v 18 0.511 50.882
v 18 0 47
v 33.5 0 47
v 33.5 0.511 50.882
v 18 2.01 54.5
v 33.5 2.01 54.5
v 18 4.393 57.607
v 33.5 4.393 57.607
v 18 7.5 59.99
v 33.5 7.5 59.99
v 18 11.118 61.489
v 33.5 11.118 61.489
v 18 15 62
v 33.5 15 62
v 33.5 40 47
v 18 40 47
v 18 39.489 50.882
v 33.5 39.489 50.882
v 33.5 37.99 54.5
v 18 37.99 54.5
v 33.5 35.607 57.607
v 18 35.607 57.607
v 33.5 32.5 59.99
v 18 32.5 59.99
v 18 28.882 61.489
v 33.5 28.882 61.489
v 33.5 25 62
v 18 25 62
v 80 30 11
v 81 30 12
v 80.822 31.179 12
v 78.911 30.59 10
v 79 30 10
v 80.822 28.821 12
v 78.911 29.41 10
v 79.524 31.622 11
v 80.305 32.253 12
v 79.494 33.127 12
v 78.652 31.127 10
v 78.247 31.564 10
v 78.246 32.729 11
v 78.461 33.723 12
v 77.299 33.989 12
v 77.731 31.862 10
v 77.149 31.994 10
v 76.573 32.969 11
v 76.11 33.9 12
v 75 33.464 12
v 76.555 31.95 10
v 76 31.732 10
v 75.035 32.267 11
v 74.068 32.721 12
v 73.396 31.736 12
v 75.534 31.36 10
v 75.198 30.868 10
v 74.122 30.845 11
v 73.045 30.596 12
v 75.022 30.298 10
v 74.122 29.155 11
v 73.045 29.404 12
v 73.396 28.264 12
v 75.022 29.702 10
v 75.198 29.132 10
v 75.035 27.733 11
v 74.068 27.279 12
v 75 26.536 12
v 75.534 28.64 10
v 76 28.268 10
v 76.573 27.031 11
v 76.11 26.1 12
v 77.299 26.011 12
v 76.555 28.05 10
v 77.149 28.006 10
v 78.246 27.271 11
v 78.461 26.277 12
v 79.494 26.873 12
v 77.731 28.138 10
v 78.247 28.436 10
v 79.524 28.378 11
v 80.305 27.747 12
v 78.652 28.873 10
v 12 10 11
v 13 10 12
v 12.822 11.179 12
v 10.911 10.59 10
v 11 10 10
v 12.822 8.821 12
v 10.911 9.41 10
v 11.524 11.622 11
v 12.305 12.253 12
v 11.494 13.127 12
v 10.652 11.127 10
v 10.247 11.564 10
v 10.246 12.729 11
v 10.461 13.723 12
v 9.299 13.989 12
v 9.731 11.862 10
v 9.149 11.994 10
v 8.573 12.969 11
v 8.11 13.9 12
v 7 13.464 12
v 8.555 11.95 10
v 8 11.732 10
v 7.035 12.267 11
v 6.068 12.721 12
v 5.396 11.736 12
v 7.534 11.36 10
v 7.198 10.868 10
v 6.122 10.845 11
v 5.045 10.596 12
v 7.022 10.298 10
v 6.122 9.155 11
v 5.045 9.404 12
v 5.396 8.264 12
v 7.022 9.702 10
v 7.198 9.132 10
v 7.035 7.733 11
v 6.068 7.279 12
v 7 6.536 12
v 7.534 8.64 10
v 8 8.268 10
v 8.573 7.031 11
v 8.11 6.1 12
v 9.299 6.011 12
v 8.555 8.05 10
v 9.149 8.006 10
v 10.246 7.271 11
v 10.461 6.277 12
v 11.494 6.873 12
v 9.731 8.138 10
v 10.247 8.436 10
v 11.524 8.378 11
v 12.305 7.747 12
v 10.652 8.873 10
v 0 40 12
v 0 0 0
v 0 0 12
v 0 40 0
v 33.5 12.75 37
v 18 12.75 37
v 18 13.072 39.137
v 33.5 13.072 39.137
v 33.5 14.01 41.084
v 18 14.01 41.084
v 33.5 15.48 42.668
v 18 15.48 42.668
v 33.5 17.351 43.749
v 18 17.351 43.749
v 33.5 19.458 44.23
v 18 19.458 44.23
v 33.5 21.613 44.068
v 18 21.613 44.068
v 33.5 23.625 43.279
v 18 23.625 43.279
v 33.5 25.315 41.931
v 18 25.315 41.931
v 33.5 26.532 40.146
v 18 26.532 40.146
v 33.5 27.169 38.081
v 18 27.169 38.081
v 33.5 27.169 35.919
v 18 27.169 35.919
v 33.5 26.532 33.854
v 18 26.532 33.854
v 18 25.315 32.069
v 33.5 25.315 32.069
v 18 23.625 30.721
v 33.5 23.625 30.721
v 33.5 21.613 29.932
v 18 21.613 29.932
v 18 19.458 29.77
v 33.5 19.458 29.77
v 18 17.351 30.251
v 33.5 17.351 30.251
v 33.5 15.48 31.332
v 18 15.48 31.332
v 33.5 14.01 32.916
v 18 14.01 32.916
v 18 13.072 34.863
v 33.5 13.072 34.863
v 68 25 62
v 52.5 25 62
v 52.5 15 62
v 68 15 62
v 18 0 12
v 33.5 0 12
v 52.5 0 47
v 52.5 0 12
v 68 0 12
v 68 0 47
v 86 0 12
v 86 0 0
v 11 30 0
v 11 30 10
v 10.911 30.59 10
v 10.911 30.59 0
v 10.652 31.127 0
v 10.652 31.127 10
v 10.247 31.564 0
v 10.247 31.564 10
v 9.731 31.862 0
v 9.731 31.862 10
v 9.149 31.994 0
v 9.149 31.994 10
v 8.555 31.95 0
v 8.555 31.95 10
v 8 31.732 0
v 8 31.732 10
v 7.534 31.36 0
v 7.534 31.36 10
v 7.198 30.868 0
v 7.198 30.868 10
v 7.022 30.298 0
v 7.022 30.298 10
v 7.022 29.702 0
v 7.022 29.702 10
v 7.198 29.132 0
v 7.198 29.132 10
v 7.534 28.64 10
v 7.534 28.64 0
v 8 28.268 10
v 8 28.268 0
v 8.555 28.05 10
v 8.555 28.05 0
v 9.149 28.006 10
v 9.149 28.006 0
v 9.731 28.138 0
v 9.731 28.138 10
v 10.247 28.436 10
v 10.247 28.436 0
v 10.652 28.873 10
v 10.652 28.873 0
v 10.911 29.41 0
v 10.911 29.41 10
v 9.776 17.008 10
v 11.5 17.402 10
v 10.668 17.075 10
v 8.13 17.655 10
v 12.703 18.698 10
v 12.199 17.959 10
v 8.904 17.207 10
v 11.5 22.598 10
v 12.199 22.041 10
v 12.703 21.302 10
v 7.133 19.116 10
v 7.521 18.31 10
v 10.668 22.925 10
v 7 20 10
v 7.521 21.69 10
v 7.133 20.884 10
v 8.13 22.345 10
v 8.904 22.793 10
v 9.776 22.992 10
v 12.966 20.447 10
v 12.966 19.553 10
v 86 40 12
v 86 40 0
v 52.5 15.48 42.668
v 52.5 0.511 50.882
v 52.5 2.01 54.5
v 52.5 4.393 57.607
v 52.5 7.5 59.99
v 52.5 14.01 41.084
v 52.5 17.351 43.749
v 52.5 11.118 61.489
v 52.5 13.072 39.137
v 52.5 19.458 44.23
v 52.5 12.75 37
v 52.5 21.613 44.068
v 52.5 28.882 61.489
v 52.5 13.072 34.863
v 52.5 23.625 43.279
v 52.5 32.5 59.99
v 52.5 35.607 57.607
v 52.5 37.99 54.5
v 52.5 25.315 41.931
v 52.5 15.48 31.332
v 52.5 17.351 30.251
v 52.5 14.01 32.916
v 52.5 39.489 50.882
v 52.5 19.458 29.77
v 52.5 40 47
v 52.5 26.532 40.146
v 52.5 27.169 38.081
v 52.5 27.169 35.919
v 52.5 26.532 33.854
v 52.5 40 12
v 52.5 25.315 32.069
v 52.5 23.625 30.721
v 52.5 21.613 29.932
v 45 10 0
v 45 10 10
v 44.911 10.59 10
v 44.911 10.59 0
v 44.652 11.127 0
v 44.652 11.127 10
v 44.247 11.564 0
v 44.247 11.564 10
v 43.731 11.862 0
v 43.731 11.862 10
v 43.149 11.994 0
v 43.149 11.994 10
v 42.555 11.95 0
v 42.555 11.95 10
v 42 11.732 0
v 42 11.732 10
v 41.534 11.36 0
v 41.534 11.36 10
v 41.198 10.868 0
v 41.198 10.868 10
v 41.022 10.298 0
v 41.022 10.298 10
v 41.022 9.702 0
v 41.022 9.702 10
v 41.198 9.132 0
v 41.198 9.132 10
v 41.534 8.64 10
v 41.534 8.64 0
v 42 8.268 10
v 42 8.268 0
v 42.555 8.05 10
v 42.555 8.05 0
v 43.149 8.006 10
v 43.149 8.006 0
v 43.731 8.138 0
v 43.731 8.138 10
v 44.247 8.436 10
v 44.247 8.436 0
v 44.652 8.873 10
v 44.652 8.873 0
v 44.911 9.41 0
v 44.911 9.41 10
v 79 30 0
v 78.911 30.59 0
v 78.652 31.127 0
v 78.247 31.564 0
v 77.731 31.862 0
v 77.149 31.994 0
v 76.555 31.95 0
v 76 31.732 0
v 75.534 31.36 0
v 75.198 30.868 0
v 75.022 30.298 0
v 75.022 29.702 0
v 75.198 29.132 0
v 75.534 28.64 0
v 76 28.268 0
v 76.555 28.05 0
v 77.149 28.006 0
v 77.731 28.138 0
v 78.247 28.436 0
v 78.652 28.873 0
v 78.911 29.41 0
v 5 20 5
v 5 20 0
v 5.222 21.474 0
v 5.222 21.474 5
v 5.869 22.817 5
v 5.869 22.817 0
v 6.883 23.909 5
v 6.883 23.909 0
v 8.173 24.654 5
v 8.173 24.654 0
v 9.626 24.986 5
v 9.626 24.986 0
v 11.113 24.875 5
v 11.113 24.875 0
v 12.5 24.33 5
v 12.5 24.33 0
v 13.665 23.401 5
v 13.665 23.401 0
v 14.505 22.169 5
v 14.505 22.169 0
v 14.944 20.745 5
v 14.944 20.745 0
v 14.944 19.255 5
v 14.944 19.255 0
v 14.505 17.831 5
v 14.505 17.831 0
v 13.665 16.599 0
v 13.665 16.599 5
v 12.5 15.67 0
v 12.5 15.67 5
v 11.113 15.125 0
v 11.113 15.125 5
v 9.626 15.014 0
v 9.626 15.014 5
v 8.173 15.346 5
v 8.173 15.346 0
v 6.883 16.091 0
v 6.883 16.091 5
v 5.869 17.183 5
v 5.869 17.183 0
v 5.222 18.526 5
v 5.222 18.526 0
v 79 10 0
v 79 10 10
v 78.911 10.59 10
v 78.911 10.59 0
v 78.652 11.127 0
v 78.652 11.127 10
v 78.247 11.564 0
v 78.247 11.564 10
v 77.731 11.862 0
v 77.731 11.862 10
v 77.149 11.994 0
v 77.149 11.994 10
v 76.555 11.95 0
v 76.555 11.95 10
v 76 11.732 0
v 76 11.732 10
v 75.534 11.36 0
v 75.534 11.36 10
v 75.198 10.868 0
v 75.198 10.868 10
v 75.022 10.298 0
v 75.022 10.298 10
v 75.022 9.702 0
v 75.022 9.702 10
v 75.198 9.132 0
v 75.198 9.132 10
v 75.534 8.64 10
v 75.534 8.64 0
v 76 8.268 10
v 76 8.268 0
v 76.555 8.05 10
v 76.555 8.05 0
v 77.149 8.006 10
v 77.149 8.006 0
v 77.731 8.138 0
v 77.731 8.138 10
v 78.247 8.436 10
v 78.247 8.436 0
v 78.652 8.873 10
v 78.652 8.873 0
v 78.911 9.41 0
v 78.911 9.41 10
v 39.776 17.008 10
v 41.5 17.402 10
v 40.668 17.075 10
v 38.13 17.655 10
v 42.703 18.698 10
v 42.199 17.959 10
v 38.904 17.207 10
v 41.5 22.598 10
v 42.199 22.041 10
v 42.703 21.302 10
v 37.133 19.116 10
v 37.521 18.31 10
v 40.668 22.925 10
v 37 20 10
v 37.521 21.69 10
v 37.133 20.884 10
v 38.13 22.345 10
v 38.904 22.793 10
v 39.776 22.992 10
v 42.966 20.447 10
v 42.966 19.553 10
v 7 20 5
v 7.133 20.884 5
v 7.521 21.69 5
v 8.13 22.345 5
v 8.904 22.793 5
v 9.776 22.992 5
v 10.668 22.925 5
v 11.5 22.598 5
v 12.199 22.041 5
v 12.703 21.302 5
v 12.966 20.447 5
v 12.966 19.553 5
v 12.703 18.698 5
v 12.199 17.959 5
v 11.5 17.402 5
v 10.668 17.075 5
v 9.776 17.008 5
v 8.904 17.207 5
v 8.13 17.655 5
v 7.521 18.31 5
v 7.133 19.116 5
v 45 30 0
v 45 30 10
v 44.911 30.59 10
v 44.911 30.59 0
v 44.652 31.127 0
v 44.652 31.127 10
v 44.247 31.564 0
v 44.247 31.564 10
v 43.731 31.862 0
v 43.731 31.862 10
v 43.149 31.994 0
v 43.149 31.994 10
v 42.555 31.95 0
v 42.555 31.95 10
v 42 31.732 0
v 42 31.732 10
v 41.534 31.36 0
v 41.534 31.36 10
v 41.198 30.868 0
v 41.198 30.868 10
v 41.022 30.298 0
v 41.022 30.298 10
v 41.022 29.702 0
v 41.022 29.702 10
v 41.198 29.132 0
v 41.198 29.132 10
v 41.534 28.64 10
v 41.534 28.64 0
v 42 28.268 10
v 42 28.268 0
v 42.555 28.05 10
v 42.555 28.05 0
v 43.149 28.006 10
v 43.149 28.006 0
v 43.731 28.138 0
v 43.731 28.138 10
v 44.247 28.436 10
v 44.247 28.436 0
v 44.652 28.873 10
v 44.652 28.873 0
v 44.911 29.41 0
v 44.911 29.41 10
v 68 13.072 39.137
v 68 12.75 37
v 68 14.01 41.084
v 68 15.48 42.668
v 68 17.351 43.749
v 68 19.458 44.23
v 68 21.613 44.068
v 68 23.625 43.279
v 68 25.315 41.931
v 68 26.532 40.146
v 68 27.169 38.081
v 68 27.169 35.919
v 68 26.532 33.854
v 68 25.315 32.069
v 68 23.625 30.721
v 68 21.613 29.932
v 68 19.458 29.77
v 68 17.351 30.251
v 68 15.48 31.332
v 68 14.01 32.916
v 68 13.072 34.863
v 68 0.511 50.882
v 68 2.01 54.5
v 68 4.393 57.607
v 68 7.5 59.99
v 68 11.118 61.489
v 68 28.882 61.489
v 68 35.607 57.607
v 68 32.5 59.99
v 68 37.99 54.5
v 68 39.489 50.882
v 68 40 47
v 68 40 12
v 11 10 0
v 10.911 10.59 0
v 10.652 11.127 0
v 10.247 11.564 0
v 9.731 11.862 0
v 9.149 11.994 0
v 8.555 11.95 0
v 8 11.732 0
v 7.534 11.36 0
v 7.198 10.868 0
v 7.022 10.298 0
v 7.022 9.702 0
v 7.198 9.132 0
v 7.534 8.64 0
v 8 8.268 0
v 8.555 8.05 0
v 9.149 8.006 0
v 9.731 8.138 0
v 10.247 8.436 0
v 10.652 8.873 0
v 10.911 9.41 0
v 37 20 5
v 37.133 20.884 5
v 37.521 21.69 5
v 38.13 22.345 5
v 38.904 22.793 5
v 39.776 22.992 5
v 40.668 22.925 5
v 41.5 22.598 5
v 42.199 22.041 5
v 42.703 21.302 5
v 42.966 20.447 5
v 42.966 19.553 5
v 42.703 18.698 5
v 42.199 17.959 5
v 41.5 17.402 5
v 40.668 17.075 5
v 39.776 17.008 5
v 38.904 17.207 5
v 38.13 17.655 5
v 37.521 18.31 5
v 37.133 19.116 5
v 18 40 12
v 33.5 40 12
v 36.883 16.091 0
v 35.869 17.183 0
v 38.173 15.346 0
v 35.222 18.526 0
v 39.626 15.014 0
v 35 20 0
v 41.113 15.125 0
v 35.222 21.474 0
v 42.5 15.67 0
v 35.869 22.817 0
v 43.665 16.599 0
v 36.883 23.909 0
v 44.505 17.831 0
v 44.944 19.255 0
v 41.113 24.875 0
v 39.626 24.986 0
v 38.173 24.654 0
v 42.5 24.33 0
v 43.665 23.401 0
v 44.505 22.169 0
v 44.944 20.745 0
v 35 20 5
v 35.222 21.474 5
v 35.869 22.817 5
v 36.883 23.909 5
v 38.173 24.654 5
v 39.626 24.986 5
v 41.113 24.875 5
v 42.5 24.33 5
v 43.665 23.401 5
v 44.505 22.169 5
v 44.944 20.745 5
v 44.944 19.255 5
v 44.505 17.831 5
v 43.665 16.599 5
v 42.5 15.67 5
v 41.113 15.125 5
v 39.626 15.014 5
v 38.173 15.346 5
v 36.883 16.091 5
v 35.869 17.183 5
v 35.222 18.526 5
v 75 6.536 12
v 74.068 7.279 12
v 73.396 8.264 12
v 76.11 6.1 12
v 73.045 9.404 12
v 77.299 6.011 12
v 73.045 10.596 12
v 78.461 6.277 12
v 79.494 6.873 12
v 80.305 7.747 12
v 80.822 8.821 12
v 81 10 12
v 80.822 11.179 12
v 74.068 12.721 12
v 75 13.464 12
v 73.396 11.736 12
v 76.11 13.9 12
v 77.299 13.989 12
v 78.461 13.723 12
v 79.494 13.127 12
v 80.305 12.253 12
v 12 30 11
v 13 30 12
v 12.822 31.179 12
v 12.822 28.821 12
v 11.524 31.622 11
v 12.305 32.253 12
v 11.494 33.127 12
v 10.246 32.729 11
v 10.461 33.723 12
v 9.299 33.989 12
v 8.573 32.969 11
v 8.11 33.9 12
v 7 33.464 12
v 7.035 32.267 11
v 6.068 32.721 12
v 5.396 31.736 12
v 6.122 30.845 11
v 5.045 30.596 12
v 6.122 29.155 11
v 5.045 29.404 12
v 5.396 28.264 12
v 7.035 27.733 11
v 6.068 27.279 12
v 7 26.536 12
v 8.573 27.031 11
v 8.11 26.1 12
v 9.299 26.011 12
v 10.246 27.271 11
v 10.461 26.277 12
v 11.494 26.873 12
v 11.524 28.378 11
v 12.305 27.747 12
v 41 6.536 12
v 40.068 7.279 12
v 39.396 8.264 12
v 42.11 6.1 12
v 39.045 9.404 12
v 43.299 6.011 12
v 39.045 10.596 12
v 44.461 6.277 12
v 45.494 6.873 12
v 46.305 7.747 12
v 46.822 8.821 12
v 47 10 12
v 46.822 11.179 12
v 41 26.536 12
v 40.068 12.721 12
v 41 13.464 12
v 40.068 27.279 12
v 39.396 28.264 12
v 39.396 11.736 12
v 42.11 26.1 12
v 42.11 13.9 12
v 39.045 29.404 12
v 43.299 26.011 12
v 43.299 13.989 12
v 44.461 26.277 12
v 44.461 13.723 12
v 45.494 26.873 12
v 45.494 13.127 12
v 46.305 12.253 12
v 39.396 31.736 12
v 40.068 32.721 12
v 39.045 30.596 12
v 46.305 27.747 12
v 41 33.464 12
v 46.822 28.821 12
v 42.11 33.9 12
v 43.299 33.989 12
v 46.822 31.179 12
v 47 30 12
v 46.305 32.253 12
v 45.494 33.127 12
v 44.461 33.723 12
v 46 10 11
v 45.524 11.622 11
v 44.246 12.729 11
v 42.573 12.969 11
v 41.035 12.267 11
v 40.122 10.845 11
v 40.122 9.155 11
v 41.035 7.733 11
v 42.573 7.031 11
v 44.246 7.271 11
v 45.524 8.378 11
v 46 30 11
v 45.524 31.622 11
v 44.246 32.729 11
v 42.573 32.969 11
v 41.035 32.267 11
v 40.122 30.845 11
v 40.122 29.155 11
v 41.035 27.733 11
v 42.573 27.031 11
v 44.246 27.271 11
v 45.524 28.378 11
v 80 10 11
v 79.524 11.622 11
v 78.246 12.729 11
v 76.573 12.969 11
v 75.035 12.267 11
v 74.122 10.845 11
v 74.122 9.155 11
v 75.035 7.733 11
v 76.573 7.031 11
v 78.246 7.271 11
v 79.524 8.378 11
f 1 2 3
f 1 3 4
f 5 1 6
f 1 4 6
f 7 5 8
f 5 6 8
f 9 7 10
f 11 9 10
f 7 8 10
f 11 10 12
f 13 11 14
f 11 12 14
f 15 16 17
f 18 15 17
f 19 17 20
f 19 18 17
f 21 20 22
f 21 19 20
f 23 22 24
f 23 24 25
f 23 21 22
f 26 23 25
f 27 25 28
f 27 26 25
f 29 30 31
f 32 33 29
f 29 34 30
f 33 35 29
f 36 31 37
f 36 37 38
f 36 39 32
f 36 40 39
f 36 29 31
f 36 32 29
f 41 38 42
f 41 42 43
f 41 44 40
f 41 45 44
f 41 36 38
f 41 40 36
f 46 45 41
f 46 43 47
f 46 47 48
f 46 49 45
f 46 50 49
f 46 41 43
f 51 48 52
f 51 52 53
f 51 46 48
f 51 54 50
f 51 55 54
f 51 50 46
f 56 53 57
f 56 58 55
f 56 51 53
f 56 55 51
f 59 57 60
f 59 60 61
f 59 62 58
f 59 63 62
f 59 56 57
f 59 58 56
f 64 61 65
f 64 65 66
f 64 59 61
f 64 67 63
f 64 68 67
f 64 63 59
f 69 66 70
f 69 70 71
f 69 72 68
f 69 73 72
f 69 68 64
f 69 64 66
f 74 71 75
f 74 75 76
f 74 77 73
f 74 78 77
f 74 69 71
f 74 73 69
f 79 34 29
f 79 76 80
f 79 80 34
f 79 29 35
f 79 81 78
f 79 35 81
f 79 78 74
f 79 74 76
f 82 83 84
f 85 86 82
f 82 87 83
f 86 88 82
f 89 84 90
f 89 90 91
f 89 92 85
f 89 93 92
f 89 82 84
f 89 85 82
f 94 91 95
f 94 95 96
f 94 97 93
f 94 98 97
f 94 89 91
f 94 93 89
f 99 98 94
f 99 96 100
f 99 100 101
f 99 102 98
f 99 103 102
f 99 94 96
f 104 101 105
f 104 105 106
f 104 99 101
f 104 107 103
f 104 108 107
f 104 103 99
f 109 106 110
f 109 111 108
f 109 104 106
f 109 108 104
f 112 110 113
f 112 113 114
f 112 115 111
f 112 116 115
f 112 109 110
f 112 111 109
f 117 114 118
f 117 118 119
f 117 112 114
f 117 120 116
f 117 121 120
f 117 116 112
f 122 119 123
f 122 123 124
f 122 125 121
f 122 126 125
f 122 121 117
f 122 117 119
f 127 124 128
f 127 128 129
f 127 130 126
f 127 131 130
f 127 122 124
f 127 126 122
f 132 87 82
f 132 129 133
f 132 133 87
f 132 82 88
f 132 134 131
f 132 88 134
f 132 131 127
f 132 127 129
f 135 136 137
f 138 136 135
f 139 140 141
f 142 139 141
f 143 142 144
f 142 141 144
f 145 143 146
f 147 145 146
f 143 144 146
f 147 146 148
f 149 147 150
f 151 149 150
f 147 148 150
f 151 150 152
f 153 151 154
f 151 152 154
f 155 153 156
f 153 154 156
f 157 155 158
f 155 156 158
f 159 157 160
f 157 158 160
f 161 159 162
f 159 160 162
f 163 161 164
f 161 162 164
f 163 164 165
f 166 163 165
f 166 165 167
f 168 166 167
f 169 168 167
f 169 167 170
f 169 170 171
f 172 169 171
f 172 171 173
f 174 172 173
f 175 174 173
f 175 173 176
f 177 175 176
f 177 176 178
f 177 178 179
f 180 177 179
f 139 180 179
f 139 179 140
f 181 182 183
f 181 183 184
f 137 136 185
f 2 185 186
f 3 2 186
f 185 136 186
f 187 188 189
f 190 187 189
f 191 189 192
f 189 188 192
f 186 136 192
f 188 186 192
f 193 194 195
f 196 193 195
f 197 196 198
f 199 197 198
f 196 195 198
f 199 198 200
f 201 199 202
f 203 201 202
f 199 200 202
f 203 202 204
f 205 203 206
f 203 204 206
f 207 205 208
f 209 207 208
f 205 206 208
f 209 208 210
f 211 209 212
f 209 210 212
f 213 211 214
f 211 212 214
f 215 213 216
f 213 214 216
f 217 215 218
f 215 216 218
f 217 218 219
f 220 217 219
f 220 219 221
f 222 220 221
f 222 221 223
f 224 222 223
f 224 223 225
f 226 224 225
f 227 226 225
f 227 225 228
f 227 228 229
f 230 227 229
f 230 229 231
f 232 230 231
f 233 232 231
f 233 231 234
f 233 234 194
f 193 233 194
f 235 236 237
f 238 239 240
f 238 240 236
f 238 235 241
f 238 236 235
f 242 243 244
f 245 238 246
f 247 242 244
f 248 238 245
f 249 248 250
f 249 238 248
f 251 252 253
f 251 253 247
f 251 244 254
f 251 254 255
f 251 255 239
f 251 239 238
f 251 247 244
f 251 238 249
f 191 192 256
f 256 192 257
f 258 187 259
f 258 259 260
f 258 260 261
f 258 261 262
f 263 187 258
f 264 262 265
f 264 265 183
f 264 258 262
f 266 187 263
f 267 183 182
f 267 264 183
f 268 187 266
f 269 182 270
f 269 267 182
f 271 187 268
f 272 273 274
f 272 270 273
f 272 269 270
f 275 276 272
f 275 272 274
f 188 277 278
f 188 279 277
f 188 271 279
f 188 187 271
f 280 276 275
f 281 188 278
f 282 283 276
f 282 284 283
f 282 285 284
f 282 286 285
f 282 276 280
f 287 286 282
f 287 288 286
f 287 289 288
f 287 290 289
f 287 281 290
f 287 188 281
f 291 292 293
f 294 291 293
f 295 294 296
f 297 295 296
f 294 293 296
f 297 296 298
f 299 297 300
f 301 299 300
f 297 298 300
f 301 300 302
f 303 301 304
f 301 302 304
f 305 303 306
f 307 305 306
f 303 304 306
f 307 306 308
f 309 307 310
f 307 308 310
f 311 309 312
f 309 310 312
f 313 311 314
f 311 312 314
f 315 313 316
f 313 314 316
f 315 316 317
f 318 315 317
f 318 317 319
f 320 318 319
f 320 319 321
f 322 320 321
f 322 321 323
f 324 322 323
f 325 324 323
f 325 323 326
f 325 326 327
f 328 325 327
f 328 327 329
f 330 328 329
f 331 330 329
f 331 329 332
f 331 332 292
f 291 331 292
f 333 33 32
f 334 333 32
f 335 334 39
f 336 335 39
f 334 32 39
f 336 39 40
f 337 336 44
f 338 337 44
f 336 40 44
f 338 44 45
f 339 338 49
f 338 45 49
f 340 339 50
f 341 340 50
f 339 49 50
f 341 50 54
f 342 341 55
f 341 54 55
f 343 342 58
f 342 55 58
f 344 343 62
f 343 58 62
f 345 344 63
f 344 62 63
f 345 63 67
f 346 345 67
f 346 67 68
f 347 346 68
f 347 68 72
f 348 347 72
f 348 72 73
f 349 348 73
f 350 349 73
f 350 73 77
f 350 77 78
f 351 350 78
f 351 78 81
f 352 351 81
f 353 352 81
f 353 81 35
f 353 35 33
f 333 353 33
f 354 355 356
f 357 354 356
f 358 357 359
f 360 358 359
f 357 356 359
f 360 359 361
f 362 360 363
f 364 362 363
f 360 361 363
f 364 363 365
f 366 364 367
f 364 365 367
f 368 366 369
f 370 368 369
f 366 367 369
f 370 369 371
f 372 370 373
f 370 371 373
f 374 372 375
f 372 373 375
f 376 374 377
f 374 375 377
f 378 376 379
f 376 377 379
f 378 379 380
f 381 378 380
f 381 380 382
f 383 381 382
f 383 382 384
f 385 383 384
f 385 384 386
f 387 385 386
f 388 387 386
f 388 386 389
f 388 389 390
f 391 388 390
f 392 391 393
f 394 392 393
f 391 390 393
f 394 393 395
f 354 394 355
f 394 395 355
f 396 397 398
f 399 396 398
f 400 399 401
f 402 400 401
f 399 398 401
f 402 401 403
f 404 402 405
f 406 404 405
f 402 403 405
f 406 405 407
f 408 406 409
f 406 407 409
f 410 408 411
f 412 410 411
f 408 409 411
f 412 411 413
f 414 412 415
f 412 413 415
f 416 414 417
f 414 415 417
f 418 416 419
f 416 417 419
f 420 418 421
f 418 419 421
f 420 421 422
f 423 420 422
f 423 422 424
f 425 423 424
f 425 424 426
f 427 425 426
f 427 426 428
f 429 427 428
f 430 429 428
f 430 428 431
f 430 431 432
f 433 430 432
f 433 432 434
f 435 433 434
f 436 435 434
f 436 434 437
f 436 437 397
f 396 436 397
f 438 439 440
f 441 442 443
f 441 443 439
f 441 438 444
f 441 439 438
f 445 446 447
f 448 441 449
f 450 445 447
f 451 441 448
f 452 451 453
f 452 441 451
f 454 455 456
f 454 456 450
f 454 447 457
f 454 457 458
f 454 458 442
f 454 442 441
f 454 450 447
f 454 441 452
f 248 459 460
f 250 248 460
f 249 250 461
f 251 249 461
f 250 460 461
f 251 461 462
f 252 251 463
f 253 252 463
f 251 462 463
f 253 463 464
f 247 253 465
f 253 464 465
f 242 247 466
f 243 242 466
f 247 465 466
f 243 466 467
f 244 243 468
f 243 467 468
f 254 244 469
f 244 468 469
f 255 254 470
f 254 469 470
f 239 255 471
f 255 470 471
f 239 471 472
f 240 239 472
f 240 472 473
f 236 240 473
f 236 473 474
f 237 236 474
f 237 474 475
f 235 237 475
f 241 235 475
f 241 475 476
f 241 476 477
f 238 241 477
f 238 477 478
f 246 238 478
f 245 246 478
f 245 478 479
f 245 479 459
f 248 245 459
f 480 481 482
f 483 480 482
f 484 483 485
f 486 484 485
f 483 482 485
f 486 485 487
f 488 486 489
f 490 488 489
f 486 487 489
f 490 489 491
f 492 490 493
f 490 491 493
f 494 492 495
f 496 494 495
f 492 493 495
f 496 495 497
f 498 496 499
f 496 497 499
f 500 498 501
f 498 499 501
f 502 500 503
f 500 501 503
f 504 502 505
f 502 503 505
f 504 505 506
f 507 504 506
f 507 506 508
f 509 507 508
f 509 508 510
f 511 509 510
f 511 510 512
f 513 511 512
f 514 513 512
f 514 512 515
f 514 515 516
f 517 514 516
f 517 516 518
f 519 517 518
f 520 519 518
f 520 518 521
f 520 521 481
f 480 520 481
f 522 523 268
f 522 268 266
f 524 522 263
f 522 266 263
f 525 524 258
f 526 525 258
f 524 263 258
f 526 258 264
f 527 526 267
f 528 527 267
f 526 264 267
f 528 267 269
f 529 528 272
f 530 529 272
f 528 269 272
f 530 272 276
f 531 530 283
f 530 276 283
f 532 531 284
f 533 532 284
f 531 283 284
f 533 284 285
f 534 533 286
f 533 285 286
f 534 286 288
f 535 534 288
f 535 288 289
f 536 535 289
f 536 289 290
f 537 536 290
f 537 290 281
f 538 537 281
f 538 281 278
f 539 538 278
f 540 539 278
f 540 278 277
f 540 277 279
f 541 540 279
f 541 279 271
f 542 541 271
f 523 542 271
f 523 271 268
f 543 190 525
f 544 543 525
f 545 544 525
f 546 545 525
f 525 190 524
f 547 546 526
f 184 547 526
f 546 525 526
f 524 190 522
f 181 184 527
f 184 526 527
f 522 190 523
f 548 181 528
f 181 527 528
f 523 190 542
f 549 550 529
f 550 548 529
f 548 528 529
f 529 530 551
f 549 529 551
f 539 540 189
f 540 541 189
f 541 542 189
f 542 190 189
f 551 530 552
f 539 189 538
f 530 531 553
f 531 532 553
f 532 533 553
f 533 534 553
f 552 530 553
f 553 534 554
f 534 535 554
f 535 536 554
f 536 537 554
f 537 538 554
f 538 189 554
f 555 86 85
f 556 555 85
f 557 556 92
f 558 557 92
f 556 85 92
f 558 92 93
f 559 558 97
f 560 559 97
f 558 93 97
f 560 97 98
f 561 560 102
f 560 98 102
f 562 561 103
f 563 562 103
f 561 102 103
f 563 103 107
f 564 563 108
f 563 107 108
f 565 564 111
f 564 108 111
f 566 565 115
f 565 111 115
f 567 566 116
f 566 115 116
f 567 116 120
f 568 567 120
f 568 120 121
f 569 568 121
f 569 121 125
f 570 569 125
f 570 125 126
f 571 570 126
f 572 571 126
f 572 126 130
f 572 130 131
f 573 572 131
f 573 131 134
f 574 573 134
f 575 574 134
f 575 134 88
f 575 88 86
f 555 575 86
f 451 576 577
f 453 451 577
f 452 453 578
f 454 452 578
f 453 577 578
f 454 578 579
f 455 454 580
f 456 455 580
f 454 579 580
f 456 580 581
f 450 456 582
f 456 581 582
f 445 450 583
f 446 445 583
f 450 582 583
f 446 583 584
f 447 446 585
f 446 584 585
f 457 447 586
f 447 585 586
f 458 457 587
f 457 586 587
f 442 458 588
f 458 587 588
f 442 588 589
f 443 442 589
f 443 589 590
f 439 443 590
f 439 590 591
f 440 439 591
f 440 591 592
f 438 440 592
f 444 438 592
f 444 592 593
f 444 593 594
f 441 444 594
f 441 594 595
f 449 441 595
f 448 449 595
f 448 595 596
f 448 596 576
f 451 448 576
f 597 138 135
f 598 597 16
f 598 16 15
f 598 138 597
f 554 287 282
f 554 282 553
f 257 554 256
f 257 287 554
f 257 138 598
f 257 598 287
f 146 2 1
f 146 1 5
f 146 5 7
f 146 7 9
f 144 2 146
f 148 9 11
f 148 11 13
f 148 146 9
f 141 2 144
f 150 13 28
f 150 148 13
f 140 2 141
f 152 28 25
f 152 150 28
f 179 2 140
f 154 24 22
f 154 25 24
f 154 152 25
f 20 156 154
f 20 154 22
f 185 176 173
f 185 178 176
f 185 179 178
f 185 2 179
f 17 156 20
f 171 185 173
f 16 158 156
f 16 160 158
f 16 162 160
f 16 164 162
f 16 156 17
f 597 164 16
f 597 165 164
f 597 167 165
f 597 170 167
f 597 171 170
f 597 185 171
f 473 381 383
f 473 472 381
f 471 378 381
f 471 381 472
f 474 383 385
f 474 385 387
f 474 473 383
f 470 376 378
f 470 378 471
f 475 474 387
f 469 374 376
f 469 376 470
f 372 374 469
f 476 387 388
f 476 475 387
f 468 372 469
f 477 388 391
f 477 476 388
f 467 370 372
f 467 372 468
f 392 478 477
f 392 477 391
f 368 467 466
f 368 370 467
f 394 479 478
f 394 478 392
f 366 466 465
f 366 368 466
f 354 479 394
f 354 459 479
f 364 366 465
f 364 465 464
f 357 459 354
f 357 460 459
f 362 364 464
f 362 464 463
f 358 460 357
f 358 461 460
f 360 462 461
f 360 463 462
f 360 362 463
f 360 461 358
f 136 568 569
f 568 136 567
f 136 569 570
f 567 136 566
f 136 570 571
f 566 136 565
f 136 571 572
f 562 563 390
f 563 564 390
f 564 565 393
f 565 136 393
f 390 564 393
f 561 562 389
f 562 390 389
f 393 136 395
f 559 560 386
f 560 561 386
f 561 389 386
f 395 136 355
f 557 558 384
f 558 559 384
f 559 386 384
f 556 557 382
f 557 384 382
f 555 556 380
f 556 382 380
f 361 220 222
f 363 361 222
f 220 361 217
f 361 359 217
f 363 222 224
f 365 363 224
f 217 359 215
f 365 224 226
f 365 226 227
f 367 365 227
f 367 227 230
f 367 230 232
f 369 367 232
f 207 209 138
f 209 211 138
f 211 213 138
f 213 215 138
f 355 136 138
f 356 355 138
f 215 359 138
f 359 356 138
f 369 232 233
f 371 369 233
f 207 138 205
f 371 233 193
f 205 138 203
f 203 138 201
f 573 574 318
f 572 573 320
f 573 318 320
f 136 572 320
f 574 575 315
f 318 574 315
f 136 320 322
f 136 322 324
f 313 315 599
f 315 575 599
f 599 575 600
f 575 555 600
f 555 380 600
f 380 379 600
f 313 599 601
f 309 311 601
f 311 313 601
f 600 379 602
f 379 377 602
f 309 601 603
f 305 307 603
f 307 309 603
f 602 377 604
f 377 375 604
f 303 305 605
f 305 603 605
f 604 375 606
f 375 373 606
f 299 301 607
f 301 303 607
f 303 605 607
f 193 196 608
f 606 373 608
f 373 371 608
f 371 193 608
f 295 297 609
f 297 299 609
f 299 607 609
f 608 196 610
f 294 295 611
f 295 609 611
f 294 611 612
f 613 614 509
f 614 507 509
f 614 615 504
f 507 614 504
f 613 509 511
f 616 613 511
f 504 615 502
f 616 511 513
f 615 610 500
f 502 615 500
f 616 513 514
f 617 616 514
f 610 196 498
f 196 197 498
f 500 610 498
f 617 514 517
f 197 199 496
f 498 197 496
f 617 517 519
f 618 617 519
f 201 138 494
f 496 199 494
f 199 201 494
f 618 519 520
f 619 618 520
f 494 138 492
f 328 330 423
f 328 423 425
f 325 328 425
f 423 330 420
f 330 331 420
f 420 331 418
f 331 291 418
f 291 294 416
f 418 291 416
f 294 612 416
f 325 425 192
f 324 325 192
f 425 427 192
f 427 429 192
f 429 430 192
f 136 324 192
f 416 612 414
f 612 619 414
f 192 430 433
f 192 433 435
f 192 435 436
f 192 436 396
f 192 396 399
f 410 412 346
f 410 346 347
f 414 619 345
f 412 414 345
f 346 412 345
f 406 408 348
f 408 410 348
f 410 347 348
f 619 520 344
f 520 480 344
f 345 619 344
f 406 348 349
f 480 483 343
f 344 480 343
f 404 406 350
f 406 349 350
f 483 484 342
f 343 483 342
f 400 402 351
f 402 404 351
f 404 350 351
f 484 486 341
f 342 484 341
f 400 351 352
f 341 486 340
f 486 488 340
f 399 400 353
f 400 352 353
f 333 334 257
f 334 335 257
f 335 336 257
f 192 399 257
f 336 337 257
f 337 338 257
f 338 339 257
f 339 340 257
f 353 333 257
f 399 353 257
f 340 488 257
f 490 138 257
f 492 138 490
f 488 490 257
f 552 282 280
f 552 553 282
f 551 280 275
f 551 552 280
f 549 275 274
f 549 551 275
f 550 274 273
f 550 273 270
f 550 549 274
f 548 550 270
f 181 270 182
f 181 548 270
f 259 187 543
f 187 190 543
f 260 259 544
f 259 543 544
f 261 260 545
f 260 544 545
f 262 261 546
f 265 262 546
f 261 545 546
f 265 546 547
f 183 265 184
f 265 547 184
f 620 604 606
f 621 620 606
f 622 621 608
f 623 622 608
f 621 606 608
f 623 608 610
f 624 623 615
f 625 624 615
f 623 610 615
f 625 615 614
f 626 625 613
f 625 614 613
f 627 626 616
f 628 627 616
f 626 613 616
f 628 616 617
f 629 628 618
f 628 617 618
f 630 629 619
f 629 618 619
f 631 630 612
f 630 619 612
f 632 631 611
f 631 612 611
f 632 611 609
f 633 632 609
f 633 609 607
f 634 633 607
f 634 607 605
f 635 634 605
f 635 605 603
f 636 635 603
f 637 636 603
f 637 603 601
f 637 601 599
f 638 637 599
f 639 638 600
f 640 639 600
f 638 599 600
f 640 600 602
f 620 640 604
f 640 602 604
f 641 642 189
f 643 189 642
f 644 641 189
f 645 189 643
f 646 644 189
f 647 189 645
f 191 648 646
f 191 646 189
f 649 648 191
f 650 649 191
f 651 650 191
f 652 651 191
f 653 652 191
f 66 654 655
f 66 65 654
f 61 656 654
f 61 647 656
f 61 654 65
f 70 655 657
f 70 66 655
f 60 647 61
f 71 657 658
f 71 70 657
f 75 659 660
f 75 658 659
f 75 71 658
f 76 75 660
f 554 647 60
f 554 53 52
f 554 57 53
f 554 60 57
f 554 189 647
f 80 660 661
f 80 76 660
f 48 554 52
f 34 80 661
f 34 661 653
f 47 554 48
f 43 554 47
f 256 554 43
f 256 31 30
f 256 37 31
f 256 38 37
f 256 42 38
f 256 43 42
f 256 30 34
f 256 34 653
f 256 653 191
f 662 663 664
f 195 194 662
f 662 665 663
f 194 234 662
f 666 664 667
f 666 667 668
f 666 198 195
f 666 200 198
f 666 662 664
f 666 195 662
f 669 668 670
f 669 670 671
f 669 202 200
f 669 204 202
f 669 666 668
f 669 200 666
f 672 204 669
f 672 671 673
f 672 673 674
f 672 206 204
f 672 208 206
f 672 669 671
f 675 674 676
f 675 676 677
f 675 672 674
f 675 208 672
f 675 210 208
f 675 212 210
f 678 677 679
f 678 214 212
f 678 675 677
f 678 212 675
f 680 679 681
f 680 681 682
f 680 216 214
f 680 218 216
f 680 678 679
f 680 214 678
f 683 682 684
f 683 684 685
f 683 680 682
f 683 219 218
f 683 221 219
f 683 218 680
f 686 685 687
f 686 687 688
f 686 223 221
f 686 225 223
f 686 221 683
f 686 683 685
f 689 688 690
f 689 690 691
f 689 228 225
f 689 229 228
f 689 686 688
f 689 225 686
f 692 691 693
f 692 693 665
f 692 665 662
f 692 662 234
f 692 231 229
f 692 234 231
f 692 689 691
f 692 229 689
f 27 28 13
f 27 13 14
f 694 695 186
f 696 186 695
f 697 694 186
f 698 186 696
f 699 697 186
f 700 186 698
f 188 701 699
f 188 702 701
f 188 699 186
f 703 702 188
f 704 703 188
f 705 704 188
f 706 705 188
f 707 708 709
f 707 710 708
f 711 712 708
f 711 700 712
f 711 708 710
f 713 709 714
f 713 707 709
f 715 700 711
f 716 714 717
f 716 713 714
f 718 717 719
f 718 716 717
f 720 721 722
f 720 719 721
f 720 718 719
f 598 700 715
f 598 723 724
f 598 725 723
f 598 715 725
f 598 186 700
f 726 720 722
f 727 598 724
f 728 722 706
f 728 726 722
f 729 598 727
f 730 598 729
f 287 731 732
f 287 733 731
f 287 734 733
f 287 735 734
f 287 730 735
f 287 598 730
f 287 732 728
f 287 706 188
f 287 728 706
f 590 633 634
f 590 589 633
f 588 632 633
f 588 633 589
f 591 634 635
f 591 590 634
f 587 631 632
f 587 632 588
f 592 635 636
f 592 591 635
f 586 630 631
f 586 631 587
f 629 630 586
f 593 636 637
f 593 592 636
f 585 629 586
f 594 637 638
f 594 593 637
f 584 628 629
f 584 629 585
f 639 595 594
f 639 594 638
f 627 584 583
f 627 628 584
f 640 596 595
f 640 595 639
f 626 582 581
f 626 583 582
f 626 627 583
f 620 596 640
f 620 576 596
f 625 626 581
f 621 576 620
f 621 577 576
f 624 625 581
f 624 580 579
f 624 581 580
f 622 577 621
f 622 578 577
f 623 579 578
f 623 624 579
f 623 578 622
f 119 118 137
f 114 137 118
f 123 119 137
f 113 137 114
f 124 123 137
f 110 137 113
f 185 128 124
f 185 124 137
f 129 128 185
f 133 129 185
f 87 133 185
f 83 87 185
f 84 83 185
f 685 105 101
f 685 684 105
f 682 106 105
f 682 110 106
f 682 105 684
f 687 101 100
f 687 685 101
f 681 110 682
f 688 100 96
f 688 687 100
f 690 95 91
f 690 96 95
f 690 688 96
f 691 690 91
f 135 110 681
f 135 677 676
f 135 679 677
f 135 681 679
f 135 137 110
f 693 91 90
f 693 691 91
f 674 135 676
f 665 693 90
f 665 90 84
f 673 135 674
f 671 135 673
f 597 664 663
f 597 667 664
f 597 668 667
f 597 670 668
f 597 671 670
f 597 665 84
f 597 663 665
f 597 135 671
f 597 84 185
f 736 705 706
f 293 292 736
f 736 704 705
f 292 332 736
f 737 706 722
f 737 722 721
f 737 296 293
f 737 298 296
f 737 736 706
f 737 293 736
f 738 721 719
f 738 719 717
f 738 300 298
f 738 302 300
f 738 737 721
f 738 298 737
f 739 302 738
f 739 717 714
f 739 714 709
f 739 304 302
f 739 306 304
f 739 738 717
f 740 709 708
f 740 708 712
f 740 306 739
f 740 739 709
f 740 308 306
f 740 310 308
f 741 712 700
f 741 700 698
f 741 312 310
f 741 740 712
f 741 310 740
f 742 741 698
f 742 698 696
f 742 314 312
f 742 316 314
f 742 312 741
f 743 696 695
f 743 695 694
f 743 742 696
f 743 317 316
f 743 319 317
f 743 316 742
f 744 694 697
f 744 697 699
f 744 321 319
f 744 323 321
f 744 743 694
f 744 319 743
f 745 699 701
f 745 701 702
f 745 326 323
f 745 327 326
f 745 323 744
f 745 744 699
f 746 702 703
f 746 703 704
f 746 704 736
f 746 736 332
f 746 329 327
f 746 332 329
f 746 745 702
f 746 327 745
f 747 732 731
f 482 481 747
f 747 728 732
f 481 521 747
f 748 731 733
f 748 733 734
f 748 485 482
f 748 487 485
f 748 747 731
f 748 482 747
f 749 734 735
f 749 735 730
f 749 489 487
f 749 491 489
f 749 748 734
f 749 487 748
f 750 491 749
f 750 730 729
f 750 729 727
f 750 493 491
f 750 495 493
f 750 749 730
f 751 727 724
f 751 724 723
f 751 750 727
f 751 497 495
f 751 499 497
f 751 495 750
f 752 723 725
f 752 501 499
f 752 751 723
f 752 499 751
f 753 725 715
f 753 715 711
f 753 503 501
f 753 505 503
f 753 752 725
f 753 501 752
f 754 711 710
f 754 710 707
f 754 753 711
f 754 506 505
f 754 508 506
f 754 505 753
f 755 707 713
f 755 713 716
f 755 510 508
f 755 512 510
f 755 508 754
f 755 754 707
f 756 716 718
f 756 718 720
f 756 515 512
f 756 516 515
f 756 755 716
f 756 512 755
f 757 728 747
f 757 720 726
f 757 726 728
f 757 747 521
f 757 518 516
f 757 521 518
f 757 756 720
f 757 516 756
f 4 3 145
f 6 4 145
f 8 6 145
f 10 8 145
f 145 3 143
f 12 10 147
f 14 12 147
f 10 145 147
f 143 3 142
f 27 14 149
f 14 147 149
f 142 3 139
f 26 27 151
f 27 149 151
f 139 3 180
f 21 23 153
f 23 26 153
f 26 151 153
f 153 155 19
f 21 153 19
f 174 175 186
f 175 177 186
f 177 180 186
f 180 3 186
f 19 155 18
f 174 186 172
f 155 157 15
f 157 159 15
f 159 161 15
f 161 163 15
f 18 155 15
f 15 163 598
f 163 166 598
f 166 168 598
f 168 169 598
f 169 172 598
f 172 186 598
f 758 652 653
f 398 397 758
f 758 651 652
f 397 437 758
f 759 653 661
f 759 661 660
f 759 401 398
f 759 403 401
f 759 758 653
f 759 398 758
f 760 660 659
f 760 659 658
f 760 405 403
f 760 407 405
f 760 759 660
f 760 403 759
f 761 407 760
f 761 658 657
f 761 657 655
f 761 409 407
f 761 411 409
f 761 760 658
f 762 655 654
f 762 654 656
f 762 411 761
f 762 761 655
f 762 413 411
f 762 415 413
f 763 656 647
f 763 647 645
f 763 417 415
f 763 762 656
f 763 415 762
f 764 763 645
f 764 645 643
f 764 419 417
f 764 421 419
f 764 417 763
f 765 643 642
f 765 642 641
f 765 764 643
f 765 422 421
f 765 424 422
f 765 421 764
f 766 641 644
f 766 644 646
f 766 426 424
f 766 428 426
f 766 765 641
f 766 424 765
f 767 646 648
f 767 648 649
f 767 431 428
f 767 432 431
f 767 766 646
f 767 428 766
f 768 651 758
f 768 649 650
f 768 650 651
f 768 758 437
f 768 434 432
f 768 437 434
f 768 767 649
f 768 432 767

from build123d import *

# Parameters (mm, degrees)
SKETCH1_W           = 86
SKETCH1_H           = 40
BOSS_EXTRUDE1_DEPTH = 12
SKETCH2_W           = 15.5
SKETCH2_H           = 40
BOSS_EXTRUDE2_DEPTH = 50
SKETCH3_R           = 7.25
CUT_EXTRUDE1_DEPTH  = 50
FILLET1_R           = 15
SKETCH5_R           = 2
CUT_EXTRUDE2_DEPTH  = 50
CHAMFER1_SIZE       = 2
SKETCH6_R           = 3
CUT_EXTRUDE3_DEPTH  = 10
SKETCH7_R           = 5
CUT_EXTRUDE4_DEPTH  = 5


with BuildPart() as part:
    # Sketch1 → Boss-Extrude1 (new body)
    with BuildSketch(Plane.XY):
        with Locations((43, 20)):
            Rectangle(SKETCH1_W, SKETCH1_H)
    extrude(amount=BOSS_EXTRUDE1_DEPTH)

    # Sketch2 → Boss-Extrude2 (add)
    with BuildSketch(Plane.XY.offset(12)):
        with Locations((25.75, 20)):
            Rectangle(SKETCH2_W, SKETCH2_H)
        with Locations((60.25, 20)):
            Rectangle(SKETCH2_W, SKETCH2_H)
    extrude(amount=BOSS_EXTRUDE2_DEPTH)

    # Sketch3 → Cut-Extrude1 (cut)
    with BuildSketch(Plane.ZY.offset(-18)):
        with Locations(Location((37, 20, 0), (0, 0, 270))):
            Circle(SKETCH3_R)
    extrude(amount=-CUT_EXTRUDE1_DEPTH, mode=Mode.SUBTRACT)

    # Fillet1
    fillet1_edges = [part.edges().sort_by_distance(p)[0] for p in [
        (25.75, 0, 62),
        (25.75, 40, 62),
        (60.25, 0, 62),
        (60.25, 40, 62),
    ]]
    fillet(fillet1_edges, radius=FILLET1_R)

    # Sketch5 → Cut-Extrude2 (cut)
    with BuildSketch(Plane.XY.offset(12)):
        with Locations((9, 30)):
            Circle(SKETCH5_R)
        with Locations((9, 10)):
            Circle(SKETCH5_R)
        with Locations((43, 30)):
            Circle(SKETCH5_R)
        with Locations((43, 10)):
            Circle(SKETCH5_R)
        with Locations((77, 30)):
            Circle(SKETCH5_R)
        with Locations((77, 10)):
            Circle(SKETCH5_R)
    extrude(amount=-CUT_EXTRUDE2_DEPTH, mode=Mode.SUBTRACT)

    # Chamfer1
    chamfer1_edges = [part.edges().sort_by_distance(p)[0] for p in [
        (7, 30, 12),
        (75, 10, 12),
        (75, 30, 12),
        (41, 10, 12),
        (41, 30, 12),
        (7, 10, 12),
    ]]
    chamfer(chamfer1_edges, length=CHAMFER1_SIZE)

    # Sketch6 → Cut-Extrude3 (cut)
    with BuildSketch(Plane(origin=(0, 0, 0), x_dir=(-1, 0, 0), z_dir=(0, 0, -1))):
        with Locations((-10, 20)):
            Circle(SKETCH6_R)
        with Locations((-40, 20)):
            Circle(SKETCH6_R)
    extrude(amount=-CUT_EXTRUDE3_DEPTH, mode=Mode.SUBTRACT)

    # Sketch7 → Cut-Extrude4 (cut)
    with BuildSketch(Plane(origin=(0, 0, 0), x_dir=(-1, 0, 0), z_dir=(0, 0, -1))):
        with Locations((-10, 20)):
            Circle(SKETCH7_R)
        with Locations((-40, 20)):
            Circle(SKETCH7_R)
    extrude(amount=-CUT_EXTRUDE4_DEPTH, mode=Mode.SUBTRACT)


solid = part.part
